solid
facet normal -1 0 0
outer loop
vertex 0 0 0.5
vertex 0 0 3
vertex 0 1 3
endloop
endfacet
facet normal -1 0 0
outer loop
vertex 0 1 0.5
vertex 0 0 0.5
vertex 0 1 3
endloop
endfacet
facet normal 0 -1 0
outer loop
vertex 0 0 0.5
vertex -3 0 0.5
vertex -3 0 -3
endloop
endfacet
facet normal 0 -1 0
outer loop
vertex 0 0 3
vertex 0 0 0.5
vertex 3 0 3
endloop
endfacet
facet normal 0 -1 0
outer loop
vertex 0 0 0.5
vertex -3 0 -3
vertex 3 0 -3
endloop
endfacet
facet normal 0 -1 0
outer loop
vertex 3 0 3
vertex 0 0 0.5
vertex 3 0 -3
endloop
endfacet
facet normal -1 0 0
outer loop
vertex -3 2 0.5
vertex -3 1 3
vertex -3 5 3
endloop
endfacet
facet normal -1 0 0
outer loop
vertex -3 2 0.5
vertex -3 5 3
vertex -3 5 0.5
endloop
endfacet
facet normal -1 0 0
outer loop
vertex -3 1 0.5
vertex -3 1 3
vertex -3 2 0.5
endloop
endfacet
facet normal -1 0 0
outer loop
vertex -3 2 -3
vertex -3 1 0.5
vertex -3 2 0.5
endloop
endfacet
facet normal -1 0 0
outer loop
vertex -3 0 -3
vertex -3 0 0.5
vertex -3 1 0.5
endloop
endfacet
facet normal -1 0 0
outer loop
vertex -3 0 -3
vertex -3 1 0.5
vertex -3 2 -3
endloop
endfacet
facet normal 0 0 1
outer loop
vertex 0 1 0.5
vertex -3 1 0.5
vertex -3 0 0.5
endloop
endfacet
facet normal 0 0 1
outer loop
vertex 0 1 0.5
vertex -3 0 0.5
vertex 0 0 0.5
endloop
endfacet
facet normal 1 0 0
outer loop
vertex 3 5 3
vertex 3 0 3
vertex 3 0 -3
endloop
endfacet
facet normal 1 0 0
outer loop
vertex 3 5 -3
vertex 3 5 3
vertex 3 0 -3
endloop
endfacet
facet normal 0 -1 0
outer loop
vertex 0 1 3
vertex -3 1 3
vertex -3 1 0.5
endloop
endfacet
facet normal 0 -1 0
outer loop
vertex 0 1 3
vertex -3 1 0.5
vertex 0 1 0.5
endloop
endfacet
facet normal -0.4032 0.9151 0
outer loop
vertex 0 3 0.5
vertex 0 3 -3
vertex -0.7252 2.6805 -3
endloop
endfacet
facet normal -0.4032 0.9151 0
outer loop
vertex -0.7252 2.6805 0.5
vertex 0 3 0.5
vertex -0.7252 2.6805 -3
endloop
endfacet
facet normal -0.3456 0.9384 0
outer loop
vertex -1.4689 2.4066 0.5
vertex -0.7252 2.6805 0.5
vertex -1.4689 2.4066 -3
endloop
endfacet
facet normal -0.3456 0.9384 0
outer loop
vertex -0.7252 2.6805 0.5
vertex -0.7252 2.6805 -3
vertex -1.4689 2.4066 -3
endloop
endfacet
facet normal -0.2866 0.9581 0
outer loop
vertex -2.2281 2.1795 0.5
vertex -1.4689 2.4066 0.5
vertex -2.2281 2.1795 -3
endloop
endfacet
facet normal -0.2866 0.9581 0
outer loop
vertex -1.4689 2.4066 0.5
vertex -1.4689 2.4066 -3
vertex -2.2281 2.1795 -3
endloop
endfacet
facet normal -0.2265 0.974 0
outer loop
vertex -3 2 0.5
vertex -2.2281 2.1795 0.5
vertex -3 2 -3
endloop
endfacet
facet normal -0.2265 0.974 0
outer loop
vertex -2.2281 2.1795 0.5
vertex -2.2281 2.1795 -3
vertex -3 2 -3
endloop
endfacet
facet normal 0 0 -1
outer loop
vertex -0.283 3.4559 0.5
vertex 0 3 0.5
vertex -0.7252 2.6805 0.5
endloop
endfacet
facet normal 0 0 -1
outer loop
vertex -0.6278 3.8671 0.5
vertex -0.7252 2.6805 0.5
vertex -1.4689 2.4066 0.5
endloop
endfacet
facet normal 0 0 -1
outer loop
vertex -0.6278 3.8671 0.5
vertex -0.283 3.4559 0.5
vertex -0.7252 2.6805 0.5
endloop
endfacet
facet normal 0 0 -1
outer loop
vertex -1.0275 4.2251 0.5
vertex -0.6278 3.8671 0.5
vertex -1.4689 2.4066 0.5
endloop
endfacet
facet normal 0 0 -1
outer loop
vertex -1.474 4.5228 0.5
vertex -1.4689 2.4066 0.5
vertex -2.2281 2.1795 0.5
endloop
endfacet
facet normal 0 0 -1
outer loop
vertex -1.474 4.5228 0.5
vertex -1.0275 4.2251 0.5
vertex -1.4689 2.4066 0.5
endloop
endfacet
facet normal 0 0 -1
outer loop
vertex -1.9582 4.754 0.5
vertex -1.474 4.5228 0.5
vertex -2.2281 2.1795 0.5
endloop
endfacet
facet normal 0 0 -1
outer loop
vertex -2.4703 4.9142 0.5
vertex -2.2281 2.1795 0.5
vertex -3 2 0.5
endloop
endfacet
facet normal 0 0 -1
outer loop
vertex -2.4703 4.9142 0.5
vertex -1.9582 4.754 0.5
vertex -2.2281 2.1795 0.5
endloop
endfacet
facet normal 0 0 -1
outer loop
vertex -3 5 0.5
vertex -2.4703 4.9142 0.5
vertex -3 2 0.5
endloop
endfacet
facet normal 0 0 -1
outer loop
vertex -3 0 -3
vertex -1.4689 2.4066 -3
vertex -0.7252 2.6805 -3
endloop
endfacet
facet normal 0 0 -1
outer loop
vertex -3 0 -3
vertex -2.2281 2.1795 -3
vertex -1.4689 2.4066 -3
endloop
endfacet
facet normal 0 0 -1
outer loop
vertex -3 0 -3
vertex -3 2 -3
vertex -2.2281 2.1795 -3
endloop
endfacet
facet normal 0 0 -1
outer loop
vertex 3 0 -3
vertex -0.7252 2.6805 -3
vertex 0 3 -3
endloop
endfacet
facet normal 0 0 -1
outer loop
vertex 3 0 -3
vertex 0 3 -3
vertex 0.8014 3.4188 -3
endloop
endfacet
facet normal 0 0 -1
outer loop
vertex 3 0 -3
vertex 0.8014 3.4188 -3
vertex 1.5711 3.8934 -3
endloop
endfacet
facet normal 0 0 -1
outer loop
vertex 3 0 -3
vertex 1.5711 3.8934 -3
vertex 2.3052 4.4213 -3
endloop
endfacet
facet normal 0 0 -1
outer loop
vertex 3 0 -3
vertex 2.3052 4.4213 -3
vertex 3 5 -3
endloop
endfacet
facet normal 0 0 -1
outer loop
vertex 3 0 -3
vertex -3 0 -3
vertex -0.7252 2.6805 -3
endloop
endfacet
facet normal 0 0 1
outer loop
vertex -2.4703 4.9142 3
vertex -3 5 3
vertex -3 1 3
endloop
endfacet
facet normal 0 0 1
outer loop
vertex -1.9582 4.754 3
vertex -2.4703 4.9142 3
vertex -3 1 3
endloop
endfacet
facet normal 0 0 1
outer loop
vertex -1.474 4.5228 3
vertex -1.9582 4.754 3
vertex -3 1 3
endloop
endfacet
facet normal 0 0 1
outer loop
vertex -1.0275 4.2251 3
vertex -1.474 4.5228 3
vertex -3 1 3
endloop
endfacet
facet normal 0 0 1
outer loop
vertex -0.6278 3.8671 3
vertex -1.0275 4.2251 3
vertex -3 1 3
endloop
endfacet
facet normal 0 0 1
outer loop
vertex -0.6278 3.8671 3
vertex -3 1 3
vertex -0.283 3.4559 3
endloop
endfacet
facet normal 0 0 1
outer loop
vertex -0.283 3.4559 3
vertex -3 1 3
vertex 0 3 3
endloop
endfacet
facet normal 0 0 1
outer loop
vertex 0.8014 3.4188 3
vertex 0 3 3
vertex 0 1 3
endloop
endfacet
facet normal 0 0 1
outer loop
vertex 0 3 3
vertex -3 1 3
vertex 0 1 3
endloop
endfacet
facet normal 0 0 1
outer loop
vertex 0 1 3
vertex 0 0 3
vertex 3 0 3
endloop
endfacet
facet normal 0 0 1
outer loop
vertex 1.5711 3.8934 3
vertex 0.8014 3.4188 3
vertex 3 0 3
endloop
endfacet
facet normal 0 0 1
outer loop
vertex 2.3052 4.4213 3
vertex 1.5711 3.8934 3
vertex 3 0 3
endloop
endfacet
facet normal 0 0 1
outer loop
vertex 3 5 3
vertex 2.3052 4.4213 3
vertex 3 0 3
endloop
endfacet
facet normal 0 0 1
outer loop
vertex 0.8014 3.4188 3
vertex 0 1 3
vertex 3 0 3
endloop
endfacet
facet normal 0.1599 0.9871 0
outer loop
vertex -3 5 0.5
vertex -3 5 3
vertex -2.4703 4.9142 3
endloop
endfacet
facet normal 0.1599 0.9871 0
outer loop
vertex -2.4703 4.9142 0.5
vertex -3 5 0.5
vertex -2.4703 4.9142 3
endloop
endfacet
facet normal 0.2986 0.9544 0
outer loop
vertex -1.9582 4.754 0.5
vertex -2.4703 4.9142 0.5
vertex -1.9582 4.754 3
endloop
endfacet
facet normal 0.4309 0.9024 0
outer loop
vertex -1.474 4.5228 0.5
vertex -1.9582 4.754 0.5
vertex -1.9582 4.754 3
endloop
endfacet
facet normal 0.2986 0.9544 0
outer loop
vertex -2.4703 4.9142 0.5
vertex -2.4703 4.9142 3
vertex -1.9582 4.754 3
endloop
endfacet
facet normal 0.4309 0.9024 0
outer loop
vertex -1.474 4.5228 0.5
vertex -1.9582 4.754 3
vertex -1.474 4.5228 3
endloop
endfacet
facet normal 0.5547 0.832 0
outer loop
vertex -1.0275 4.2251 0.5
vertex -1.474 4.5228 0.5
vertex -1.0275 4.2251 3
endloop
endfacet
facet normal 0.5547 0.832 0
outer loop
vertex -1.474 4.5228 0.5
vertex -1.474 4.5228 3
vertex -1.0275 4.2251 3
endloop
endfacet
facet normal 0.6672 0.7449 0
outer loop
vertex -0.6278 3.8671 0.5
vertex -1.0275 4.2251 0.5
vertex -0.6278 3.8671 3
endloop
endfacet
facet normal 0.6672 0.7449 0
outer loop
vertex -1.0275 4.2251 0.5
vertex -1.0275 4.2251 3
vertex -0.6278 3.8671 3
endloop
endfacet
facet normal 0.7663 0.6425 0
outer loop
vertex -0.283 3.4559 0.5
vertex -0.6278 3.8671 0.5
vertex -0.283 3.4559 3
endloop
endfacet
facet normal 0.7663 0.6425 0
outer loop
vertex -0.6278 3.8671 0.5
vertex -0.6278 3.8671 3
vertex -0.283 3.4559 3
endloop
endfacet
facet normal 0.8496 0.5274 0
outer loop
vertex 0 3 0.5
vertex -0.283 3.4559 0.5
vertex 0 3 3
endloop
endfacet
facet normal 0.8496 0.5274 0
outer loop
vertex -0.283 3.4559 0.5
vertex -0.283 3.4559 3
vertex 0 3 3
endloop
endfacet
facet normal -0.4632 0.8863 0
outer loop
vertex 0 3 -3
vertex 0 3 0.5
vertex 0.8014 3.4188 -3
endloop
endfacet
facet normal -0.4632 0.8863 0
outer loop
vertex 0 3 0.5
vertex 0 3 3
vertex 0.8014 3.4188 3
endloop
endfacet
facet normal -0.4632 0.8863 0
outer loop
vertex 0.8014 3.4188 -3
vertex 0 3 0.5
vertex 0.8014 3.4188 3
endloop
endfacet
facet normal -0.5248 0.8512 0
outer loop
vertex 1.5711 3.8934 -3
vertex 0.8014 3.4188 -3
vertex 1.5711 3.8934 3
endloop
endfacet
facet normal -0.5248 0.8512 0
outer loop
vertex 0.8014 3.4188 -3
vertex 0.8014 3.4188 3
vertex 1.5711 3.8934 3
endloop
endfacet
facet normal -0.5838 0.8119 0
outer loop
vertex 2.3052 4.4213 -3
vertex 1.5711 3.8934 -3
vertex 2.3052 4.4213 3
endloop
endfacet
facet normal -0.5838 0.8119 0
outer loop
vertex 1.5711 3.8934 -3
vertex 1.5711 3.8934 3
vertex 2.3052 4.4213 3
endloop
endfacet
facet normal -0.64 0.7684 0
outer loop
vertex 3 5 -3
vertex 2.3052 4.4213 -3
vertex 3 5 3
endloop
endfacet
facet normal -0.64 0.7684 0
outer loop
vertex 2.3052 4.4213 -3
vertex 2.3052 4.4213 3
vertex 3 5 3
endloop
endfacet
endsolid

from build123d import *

# Parameters (mm, degrees)
SKETCH1_W           = 6
SKETCH1_H           = 6
BOSS_EXTRUDE1_DEPTH = 5
CUT_EXTRUDE7_DEPTH  = 12.5
CUT_EXTRUDE8_DEPTH  = 3.5
SKETCH10_W          = 3
SKETCH10_H          = 1
CUT_EXTRUDE9_DEPTH  = 2.5


with BuildPart() as part:
    # Sketch1 → Boss-Extrude1 (new body)
    with BuildSketch(Plane(origin=(0, 0, 0), x_dir=(1, 0, 0), z_dir=(0, 1, 0))):
        Rectangle(SKETCH1_W, SKETCH1_H)
    extrude(amount=BOSS_EXTRUDE1_DEPTH)

    # Sketch8 → Cut-Extrude7 (cut)
    with BuildSketch(Plane.XY.offset(3)):
        with BuildLine():
            ThreePointArc((0, 3), (1.571067812, 3.893398282), (3, 5))
            Line((3, 5), (-3, 5))
            ThreePointArc((-3, 5), (-1.245414444, 4.381878334), (0, 3))
        make_face()
    extrude(amount=-CUT_EXTRUDE7_DEPTH, mode=Mode.SUBTRACT)

    # Sketch9 → Cut-Extrude8 (cut)
    with BuildSketch(Plane(origin=(0, 0, -3), x_dir=(-1, 0, 0), z_dir=(0, 0, -1))):
        with BuildLine():
            ThreePointArc((0, 3), (1.468871126, 2.406613378), (3, 2))
            Line((3, 2), (3, 5))
            ThreePointArc((3, 5), (1.245414444, 4.381878334), (0, 3))
        make_face()
    extrude(amount=-CUT_EXTRUDE8_DEPTH, mode=Mode.SUBTRACT)

    # Sketch10 → Cut-Extrude9 (cut)
    with BuildSketch(Plane.XY.offset(3)):
        with Locations((-1.5, 0.5)):
            Rectangle(SKETCH10_W, SKETCH10_H)
    extrude(amount=-CUT_EXTRUDE9_DEPTH, mode=Mode.SUBTRACT)


solid = part.part
